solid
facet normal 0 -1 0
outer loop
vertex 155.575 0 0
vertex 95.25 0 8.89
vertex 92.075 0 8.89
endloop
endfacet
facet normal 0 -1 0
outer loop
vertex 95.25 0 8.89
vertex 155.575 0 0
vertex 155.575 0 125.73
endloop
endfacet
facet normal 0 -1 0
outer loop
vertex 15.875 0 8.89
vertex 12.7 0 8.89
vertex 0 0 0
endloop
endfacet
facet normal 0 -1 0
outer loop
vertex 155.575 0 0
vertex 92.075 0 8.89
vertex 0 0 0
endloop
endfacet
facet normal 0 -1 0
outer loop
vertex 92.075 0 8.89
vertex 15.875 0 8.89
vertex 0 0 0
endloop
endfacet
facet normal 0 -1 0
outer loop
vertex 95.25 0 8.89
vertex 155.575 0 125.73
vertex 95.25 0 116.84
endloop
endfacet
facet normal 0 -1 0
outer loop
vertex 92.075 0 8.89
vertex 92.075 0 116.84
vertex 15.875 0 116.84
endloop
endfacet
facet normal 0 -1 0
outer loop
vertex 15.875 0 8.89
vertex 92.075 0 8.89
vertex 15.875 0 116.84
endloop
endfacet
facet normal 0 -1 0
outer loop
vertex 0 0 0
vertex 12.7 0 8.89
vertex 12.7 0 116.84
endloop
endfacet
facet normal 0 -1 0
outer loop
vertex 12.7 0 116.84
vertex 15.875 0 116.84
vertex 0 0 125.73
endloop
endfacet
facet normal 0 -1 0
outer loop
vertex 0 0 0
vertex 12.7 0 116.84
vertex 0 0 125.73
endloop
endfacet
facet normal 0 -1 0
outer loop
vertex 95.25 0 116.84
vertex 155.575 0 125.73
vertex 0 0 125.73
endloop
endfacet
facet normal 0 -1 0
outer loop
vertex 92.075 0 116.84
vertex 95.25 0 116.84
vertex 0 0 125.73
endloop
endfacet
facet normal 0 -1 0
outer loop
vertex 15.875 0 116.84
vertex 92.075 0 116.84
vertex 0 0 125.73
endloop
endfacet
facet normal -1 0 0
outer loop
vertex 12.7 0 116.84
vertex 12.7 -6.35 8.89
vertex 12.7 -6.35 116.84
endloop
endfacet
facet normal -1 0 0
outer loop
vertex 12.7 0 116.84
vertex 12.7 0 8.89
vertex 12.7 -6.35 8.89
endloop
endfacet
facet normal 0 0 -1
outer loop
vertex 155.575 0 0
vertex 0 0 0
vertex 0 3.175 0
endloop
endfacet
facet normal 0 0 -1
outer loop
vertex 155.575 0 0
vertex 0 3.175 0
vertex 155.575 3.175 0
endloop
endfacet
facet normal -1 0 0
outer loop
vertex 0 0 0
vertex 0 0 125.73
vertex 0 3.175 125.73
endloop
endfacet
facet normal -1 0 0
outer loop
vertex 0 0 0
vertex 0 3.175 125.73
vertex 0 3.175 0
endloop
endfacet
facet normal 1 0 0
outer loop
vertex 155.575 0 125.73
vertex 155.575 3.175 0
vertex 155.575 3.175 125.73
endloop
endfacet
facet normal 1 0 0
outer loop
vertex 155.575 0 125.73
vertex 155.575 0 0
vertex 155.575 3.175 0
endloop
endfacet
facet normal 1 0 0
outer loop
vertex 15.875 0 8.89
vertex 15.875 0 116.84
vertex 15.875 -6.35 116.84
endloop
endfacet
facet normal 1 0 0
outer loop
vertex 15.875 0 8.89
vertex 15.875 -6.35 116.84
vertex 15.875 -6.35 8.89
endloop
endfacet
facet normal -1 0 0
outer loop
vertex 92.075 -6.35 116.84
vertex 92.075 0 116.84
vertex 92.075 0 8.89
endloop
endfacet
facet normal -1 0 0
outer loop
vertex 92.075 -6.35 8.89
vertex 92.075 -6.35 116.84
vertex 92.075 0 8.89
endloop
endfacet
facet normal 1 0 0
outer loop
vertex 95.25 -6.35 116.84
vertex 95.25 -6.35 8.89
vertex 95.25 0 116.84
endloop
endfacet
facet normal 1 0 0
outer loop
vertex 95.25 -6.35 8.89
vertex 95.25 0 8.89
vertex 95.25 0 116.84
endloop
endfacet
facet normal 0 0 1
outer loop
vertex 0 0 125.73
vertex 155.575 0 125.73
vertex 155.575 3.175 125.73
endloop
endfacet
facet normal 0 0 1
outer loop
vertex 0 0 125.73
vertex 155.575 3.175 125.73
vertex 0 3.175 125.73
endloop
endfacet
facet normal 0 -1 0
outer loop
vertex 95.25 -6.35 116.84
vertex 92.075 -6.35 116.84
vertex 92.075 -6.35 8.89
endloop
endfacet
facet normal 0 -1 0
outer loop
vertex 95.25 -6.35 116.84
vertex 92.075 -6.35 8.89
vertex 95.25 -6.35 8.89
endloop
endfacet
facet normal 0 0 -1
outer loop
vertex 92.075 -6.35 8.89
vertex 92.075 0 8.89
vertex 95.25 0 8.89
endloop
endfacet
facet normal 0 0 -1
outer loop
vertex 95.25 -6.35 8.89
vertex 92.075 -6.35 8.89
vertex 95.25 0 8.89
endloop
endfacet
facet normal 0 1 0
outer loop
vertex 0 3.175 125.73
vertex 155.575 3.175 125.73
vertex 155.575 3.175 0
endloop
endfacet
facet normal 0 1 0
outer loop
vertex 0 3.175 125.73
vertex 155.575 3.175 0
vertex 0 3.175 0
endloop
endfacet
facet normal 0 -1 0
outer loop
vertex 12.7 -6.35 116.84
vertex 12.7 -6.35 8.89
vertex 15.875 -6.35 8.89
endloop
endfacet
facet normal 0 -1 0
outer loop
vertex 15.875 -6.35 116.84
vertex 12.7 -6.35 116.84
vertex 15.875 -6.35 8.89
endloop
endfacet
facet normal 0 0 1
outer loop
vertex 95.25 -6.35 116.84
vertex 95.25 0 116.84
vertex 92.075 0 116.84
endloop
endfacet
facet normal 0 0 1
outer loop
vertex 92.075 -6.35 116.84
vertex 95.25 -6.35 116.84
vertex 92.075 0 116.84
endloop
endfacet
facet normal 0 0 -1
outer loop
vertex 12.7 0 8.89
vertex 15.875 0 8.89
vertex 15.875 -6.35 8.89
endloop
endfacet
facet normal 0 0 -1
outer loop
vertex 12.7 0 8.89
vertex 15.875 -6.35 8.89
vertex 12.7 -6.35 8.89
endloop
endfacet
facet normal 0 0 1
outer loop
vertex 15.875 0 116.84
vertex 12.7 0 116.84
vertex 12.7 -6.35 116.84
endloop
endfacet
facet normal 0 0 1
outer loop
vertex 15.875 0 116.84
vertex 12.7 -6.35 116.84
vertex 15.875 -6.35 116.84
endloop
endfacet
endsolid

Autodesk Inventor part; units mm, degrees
ref_plane "YZ Plane" through (0, 0, 0) normal (1, 0, 0) x (0, 1, 0)
ref_plane "XZ Plane" through (0, 0, 0) normal (0, 1, 0) x (-1, 0, 0)
ref_plane "XY Plane" through (0, 0, 0) normal (0, 0, 1) x (1, 0, 0)
sketch "Sketch1" plane through (0, 0, 0) normal (0, 1, 0) x (-1, 0, 0)
  line L0 (0, 0) -> (-155.575, 0)
  line L1 (-155.575, 0) -> (-155.575, 125.73)
  line L2 (-155.575, 125.73) -> (0, 125.73)
  line L3 (0, 125.73) -> (0, 0)
  dimension "d0" = 155.575
  dimension "d1" = 125.73
extrude "Extrusion1" add sketch "Sketch1" along normal blind 3.175
sketch "Sketch2" plane through (0, 0, 0) normal (0, -1, 0) x (1, 0, 0)
  line L0 (155.575, 0) -> (0, 0) construction
  line L1 (0, 0) -> (12.7, 0) construction
  line L2 (0, 125.73) -> (155.575, 125.73) construction
  line L3 (12.7, 0) -> (15.875, 0) construction
  line L4 (15.875, 0) -> (15.875, 125.73) construction
  line L5 (15.875, 125.73) -> (12.7, 125.73) construction
  line L6 (12.7, 125.73) -> (12.7, 0) construction
  line L7 (15.875, 0) -> (92.075, 0) construction
  line L8 (23.8468, 0) -> (23.8468, 8.89) construction
  line L9 (23.8468, 125.73) -> (23.8468, 116.84) construction
  line L10 (23.8468, 8.89) -> (15.875, 8.89) construction
  line L11 (23.8468, 116.84) -> (15.875, 116.84) construction
  line L12 (92.075, 0) -> (92.075, 125.73) construction
  line L13 (23.8468, 116.84) -> (92.075, 116.84) construction
  line L14 (23.8468, 8.89) -> (92.075, 8.89) construction
  line L15 (15.875, 8.89) -> (12.7, 8.89)
  line L16 (12.7, 8.89) -> (12.7, 116.84)
  line L17 (12.7, 116.84) -> (15.875, 116.84)
  line L18 (15.875, 116.84) -> (15.875, 8.89)
  line L19 (92.075, 8.89) -> (95.25, 8.89)
  line L20 (95.25, 8.89) -> (95.25, 116.84)
  line L21 (95.25, 116.84) -> (92.075, 116.84)
  line L22 (92.075, 116.84) -> (92.075, 8.89)
  dimension "d4" = 12.7
  dimension "d5" = 3.175
  dimension "d6" = 76.2
  dimension "d11" = 8.89
  dimension "d12" = 8.89
  dimension "d13" = 3.175
  dimension "d14" = 107.95
extrude "Extrusion2" add sketch "Sketch2" along normal blind 6.35
properties part number "False_Bottom"
